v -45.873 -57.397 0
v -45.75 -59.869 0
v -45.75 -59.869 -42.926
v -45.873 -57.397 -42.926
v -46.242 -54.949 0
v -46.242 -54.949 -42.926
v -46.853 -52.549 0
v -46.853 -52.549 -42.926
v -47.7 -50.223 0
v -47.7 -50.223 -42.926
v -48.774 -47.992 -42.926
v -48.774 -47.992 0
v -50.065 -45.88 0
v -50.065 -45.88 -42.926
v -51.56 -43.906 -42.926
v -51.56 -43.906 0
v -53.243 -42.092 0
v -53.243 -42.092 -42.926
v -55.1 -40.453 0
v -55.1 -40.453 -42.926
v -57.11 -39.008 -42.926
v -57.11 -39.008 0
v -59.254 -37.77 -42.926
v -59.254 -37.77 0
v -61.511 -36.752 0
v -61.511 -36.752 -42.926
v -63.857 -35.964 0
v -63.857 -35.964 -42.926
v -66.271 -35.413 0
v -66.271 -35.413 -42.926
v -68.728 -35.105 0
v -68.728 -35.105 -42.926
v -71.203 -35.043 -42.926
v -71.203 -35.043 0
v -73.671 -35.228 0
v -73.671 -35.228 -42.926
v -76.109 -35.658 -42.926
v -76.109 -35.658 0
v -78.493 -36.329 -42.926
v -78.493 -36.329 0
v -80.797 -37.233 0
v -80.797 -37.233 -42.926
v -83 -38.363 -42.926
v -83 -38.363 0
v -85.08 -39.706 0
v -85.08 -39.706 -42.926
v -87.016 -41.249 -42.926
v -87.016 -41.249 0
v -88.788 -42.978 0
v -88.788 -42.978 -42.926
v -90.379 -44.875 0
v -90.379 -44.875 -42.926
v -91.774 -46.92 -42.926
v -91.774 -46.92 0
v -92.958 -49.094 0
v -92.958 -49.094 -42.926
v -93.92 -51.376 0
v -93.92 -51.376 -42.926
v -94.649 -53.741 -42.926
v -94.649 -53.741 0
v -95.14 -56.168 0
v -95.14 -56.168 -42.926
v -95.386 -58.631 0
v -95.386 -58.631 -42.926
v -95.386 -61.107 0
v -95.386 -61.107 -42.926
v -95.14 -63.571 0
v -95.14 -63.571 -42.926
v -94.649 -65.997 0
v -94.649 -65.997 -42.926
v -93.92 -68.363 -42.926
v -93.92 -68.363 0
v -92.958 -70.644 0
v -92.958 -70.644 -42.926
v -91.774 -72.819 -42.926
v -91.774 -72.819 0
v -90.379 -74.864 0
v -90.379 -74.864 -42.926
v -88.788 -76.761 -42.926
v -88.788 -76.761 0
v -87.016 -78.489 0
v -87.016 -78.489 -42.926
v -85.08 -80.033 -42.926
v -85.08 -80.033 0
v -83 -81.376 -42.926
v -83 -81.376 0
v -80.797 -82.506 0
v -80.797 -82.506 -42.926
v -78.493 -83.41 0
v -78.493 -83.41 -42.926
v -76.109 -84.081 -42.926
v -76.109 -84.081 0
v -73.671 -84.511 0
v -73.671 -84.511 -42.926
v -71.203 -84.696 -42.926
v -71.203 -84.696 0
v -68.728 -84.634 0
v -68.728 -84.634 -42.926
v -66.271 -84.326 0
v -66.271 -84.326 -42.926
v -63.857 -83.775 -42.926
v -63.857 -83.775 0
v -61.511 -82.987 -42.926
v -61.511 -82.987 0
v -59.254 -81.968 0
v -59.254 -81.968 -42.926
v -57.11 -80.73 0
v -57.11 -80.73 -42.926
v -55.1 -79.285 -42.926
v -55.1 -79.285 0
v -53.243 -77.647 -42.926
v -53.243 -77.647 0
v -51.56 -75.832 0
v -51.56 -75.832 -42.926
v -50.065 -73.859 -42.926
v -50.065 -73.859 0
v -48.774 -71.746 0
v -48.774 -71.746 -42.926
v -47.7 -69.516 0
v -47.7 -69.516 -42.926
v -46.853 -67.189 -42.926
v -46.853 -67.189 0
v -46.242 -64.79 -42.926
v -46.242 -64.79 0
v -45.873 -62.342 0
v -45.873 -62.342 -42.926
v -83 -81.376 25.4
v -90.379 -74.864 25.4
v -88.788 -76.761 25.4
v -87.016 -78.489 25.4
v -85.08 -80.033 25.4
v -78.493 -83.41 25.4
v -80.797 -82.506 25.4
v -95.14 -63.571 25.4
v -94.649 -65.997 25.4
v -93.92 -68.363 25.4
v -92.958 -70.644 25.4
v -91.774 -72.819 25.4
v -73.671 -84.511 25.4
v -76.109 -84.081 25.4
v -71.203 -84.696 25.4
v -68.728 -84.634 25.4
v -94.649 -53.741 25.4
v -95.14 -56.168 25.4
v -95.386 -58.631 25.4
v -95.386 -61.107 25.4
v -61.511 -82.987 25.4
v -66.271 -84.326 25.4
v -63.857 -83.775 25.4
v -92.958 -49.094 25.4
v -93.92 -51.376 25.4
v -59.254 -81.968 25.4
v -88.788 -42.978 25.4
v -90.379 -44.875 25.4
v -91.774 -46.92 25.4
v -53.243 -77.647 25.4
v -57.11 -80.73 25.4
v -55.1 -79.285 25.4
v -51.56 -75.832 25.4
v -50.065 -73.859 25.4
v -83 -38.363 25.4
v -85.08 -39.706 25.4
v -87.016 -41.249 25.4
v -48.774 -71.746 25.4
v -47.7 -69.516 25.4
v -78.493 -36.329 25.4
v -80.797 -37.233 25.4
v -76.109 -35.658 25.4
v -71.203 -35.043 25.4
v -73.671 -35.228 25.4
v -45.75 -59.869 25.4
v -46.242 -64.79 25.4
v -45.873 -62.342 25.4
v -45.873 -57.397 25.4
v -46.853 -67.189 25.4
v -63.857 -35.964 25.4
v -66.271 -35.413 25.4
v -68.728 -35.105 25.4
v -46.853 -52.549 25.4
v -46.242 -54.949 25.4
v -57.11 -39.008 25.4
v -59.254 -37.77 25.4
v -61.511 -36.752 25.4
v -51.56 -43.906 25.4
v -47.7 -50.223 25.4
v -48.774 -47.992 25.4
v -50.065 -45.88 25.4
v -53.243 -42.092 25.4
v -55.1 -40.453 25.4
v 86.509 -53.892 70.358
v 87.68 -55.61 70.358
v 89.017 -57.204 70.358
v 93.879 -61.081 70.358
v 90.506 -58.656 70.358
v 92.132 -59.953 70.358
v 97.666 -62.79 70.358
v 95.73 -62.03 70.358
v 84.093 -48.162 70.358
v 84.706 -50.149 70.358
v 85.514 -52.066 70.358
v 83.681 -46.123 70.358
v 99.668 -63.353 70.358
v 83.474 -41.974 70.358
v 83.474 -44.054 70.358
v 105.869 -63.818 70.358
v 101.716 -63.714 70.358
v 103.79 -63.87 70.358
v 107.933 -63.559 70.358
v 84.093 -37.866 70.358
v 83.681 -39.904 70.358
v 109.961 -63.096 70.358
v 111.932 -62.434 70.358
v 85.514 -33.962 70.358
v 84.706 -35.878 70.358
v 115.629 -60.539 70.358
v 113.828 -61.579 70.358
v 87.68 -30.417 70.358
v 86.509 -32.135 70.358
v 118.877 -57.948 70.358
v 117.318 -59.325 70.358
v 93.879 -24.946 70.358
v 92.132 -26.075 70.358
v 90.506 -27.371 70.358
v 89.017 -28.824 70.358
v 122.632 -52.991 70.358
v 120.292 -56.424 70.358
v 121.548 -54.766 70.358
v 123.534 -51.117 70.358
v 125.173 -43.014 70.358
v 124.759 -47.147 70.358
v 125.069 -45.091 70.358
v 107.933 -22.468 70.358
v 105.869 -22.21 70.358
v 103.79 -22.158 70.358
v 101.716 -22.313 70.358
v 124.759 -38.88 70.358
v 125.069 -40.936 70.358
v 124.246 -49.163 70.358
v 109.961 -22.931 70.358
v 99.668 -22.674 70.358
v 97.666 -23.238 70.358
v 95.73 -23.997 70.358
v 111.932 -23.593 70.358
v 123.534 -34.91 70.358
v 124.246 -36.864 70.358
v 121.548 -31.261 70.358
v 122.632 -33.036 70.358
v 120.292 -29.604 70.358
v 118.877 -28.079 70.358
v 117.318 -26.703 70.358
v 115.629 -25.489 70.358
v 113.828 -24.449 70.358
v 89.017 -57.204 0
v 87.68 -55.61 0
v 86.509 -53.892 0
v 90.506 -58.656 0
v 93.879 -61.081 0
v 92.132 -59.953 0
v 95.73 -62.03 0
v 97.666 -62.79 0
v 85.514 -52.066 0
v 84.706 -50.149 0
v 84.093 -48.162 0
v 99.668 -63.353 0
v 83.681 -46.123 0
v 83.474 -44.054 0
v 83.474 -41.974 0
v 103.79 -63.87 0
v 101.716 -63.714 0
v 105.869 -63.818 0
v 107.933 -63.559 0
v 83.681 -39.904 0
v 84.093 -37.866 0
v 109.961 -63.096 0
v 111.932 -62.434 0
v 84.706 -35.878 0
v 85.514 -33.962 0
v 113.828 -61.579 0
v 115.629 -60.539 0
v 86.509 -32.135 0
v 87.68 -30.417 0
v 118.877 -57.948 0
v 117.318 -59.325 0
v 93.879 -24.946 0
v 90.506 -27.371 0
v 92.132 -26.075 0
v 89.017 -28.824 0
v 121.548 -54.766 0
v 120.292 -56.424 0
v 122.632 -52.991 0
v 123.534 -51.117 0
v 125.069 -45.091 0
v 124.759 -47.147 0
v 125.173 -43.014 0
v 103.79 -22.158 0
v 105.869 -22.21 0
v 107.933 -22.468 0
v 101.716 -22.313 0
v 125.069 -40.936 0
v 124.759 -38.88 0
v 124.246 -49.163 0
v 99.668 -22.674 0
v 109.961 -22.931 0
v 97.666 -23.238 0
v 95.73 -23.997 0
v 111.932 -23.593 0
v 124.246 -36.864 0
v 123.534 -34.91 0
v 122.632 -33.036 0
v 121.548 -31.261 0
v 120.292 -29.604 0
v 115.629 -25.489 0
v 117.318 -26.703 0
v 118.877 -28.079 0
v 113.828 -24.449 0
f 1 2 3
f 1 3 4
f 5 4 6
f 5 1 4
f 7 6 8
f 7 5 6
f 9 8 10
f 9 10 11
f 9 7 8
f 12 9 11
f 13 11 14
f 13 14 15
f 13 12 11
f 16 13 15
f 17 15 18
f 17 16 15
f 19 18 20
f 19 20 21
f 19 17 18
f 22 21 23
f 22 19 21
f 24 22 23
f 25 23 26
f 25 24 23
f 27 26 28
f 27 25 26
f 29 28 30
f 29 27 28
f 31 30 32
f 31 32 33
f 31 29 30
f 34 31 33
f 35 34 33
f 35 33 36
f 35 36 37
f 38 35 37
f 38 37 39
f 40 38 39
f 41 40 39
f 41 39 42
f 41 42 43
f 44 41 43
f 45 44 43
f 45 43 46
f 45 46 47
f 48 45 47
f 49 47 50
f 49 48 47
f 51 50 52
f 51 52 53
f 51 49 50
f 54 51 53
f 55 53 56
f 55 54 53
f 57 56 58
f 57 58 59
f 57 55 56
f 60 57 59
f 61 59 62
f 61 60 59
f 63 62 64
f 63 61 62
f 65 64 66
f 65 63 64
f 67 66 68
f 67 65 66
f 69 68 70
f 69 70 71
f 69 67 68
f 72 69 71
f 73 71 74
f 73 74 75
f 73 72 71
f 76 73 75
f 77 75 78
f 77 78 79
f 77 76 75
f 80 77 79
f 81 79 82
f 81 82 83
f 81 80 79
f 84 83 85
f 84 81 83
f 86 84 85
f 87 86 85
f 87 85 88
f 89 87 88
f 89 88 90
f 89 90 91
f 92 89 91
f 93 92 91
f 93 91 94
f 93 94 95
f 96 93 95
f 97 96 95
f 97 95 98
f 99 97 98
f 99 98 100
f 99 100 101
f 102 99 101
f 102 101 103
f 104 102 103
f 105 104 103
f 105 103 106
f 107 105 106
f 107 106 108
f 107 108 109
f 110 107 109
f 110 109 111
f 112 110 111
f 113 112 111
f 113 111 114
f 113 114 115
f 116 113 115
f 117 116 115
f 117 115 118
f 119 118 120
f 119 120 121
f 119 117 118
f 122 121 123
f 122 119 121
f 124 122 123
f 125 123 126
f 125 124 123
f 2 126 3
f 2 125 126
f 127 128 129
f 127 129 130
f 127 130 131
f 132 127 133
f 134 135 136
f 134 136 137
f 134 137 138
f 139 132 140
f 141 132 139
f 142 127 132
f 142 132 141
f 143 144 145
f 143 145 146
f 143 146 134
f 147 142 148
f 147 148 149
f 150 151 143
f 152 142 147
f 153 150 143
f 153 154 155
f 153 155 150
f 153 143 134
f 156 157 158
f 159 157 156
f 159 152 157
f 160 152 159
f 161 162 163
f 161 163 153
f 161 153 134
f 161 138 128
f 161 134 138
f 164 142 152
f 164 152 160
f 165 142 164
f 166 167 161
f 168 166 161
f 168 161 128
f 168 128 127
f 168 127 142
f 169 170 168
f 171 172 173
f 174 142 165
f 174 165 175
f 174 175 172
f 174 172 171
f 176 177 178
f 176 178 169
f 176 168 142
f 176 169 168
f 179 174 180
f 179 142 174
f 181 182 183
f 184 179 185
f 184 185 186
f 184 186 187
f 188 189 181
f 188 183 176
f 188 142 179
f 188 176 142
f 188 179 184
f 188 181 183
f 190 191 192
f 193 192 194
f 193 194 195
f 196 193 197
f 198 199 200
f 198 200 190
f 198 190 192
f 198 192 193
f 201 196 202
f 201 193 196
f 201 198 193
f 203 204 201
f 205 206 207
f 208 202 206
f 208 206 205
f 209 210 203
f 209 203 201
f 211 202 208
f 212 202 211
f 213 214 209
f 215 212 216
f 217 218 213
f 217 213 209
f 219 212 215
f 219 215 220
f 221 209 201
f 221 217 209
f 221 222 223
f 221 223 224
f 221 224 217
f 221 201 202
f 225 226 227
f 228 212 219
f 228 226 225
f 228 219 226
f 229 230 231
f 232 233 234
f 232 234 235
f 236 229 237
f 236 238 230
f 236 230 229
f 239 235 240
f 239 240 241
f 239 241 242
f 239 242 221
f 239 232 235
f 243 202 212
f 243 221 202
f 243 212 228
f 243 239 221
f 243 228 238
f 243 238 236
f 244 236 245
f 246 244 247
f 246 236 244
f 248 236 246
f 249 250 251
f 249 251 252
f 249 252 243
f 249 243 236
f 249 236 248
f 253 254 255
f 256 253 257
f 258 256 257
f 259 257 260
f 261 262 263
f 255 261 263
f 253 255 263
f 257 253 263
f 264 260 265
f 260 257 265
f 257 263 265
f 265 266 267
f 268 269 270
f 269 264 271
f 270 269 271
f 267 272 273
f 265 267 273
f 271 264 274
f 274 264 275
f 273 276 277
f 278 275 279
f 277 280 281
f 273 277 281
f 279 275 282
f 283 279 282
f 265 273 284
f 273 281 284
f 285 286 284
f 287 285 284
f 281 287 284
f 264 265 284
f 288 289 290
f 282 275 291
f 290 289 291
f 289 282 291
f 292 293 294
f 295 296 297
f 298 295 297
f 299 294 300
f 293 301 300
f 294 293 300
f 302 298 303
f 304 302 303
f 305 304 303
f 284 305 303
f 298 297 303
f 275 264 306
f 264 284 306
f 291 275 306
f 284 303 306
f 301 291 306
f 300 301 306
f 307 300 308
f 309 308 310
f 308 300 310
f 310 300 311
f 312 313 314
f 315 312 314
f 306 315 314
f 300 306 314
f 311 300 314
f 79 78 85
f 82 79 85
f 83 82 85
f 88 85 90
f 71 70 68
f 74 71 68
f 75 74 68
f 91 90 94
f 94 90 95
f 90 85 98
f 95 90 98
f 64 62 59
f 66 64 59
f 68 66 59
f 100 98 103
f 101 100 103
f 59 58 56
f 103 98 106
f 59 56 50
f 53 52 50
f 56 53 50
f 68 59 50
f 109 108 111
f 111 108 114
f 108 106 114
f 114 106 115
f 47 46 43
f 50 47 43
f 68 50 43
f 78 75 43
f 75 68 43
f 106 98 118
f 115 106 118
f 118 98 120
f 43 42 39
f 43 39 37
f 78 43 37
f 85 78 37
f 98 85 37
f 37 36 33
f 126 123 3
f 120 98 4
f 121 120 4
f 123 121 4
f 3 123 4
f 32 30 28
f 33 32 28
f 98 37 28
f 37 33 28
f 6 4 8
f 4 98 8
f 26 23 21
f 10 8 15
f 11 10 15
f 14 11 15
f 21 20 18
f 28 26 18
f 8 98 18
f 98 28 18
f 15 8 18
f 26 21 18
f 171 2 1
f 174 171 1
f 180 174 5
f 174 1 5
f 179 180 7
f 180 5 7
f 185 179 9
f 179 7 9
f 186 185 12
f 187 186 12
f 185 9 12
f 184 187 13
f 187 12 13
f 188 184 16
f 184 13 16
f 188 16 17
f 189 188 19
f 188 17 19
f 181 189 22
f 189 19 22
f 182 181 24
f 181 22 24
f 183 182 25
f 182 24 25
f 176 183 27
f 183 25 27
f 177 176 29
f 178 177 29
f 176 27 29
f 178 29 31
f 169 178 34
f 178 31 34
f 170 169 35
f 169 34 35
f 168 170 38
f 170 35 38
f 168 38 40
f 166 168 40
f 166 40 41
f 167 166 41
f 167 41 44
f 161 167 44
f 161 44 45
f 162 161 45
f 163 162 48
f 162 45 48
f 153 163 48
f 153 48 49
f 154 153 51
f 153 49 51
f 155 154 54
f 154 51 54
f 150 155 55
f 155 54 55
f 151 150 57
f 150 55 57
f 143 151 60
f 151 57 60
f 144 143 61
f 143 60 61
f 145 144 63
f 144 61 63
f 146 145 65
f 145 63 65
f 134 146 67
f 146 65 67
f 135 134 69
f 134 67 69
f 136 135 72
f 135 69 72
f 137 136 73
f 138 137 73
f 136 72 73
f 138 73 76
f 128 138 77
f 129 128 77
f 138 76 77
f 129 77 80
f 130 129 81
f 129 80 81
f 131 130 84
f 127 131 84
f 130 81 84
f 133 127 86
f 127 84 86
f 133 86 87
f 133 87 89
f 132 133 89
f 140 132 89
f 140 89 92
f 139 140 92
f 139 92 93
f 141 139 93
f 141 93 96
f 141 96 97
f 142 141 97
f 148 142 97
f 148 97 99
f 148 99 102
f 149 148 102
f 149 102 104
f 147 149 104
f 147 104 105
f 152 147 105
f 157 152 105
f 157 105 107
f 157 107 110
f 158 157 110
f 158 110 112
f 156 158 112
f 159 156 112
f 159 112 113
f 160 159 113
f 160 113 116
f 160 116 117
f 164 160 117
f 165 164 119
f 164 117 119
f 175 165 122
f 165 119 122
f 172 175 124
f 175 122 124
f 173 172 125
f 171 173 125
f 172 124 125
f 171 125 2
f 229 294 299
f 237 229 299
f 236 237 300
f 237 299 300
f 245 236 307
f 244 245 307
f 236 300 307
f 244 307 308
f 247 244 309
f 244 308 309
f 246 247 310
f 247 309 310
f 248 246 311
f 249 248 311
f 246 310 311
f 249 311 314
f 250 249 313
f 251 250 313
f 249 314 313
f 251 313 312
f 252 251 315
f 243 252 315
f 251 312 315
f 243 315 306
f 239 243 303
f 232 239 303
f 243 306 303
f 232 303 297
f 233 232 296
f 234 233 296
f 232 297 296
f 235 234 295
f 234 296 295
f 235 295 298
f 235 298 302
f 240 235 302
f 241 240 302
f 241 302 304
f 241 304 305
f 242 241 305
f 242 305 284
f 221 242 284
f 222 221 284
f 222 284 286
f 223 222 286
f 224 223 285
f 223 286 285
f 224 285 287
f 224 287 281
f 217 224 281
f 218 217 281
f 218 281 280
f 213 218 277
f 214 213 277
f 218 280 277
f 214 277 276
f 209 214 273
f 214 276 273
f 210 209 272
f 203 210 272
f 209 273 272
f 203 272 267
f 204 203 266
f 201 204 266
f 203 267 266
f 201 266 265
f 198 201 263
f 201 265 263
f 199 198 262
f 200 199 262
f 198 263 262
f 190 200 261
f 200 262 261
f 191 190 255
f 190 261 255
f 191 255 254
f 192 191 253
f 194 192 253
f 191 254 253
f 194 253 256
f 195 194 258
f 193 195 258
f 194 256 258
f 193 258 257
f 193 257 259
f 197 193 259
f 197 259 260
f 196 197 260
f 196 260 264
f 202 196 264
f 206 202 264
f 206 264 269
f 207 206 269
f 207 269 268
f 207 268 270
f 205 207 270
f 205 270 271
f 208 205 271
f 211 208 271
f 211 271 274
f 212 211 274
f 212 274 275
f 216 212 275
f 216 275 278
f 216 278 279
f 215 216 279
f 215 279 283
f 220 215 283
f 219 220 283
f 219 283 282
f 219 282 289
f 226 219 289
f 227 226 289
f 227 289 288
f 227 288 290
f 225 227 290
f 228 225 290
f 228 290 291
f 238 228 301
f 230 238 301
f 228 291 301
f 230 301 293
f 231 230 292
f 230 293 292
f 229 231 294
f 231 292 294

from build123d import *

# Parameters (mm, degrees)
F0_R      = 20.862419
F1_DEPTH  = 70.358
F2_R      = 24.833887
F3_DEPTH  = 42.926
F3_FACE_R = 24.833887
F4_DEPTH  = 25.4


with BuildPart() as f1:
    # F0 (on Top) → F1 (new body)
    with BuildSketch(Plane.XY):
        with Locations((104.310215, -43.013666)):
            Circle(F0_R)
    extrude(amount=F1_DEPTH)


with BuildPart() as f3:
    # F2 (on Top) → F3 (new body)
    with BuildSketch(Plane.XY):
        with Locations((-70.583418, -59.86936)):
            Circle(F2_R)
    extrude(amount=-F3_DEPTH)

    # F3_face (on face) → F4 (join)
    with BuildSketch(Plane(origin=(-70.583418, -59.86936, 0), x_dir=(1, 0, 0), z_dir=(0, 0, 1))):
        Circle(F3_FACE_R)
    extrude(amount=F4_DEPTH)


solid = Compound([f1.part, f3.part])
